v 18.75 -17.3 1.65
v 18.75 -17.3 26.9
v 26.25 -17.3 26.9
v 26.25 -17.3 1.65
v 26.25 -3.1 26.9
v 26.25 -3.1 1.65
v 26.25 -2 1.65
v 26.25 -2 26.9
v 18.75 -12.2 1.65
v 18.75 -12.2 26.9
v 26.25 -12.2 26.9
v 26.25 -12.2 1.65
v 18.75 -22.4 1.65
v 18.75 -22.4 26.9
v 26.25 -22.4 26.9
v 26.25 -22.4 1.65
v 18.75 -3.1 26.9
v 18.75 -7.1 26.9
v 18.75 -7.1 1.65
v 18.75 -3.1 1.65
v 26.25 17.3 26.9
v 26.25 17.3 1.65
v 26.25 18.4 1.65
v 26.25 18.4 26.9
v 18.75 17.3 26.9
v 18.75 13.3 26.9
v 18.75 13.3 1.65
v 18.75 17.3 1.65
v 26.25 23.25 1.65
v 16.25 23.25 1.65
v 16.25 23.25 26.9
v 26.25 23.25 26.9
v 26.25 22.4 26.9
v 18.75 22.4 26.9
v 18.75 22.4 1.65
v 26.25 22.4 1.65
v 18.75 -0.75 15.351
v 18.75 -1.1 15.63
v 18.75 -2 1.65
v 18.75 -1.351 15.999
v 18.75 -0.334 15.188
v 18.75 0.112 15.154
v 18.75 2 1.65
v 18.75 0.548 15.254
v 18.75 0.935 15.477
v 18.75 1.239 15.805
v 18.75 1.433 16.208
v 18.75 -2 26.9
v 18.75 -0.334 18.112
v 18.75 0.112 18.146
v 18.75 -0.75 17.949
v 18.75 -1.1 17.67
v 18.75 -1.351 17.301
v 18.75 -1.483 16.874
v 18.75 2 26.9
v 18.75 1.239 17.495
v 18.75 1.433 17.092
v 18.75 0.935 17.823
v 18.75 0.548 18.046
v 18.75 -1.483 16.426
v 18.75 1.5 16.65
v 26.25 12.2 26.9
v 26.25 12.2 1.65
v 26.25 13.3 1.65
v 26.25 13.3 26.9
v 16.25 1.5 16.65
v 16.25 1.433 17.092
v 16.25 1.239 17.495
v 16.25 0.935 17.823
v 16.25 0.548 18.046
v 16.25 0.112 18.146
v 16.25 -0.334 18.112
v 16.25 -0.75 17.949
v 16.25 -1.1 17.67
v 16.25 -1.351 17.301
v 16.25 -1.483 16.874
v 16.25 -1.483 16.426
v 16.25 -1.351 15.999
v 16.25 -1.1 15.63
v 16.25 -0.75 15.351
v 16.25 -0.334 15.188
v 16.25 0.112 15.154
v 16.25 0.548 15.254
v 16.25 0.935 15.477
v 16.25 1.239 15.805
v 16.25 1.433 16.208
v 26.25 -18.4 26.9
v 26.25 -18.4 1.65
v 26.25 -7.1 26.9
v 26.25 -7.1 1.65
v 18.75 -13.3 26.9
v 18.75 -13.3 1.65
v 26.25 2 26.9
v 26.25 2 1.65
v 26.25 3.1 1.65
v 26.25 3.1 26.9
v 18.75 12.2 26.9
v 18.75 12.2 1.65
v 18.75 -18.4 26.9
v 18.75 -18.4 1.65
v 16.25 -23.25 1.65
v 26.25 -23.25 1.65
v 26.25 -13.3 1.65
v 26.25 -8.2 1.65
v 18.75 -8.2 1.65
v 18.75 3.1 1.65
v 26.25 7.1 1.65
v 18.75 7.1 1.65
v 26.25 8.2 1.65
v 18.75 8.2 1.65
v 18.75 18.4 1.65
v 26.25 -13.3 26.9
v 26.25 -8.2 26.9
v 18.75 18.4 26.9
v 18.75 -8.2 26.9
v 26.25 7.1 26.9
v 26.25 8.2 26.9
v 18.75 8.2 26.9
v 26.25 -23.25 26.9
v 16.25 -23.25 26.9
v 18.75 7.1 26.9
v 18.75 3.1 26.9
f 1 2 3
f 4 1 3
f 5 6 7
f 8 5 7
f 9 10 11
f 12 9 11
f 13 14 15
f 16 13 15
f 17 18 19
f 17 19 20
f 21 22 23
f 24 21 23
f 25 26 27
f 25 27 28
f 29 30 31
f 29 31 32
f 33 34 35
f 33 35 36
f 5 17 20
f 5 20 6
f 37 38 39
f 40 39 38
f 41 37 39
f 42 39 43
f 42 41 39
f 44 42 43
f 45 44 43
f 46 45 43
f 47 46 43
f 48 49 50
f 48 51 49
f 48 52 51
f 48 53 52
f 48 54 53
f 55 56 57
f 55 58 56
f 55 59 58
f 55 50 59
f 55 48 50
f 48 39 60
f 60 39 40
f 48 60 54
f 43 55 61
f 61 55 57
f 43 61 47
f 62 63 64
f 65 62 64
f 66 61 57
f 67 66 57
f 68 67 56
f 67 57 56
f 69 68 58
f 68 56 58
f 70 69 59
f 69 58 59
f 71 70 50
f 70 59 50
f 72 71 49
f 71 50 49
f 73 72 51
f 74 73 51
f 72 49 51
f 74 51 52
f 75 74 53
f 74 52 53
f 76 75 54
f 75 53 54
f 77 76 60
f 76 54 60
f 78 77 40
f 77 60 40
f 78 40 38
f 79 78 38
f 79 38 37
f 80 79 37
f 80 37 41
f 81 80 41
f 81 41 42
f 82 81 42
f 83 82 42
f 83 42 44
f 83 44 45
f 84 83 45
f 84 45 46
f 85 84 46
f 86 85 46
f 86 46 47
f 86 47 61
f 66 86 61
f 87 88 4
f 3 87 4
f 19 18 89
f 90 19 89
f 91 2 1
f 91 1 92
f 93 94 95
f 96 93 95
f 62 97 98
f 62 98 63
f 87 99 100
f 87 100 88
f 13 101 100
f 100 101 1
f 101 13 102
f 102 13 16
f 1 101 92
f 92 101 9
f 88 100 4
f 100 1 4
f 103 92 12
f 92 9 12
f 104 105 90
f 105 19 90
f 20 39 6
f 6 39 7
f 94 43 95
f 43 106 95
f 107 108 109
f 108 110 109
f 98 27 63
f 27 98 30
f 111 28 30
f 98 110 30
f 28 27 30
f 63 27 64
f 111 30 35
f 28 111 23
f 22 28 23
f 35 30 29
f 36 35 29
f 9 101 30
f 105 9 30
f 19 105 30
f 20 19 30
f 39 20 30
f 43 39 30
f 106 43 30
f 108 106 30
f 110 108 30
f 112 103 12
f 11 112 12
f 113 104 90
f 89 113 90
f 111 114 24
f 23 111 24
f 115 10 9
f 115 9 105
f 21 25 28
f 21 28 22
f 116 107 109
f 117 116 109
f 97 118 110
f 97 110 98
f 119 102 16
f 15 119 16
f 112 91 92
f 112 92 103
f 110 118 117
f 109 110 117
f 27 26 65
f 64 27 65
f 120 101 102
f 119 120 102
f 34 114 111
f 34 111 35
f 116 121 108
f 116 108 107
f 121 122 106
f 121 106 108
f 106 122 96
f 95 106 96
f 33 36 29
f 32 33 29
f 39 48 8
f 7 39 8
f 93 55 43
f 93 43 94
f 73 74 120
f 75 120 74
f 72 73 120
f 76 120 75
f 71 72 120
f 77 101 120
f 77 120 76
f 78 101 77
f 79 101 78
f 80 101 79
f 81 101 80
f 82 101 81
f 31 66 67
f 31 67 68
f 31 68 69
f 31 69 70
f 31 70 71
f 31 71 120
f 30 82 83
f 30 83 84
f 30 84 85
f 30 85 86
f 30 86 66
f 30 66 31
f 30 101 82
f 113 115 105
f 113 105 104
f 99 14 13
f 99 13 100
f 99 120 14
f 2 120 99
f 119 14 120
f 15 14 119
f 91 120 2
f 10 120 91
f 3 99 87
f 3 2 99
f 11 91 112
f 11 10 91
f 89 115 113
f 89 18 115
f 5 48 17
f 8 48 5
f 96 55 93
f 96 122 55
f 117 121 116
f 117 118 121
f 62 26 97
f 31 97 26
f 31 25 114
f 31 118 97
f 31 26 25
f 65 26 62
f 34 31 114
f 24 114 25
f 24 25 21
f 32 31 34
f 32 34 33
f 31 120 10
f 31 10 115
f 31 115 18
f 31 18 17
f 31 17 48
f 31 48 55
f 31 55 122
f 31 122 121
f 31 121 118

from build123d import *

# Parameters (mm, degrees)
SKETCH002_W     = 10
SKETCH002_H     = 46.5
PAD001_DEPTH    = 25.25
SKETCH003_W     = 10
SKETCH003_H     = 4
POCKET001_DEPTH = 25.25
SKETCH004_R     = 1.5
POCKET002_DEPTH = 5


with BuildPart() as part:
    # Sketch002 → Pad001 (new body)
    with BuildSketch(Plane.XY):
        Rectangle(SKETCH002_W, SKETCH002_H)
    extrude(amount=PAD001_DEPTH)

    # Sketch003 (on Face6 of Pad001) → Pocket001 (cut)
    with BuildSketch(Plane.XY.offset(25.25)):
        with Locations((2.5, 20.4)):
            Rectangle(SKETCH003_W, SKETCH003_H)
        with Locations((2.5, 10.2)):
            Rectangle(SKETCH003_W, SKETCH003_H)
        with Locations((2.5, 15.3)):
            Rectangle(SKETCH003_W, SKETCH003_H)
        with Locations((2.5, 5.1)):
            Rectangle(SKETCH003_W, SKETCH003_H)
        with Locations((2.5, 0)):
            Rectangle(SKETCH003_W, SKETCH003_H)
        with Locations((2.5, -20.4)):
            Rectangle(SKETCH003_W, SKETCH003_H)
        with Locations((2.5, -15.3)):
            Rectangle(SKETCH003_W, SKETCH003_H)
        with Locations((2.5, -10.2)):
            Rectangle(SKETCH003_W, SKETCH003_H)
        with Locations((2.5, -5.1)):
            Rectangle(SKETCH003_W, SKETCH003_H)
    extrude(amount=-POCKET001_DEPTH, mode=Mode.SUBTRACT)

    # Sketch004 (on Face26 of Pocket001) → Pocket002 (cut)
    with BuildSketch(Plane.YZ.offset(-2.5)):
        with Locations((0, 15)):
            Circle(SKETCH004_R)
    extrude(amount=-POCKET002_DEPTH, mode=Mode.SUBTRACT)


with BuildPart() as part_1:
    # Body001 placement: moved
    add(part.part.moved(Location((21.25, 0, 1.65))))


solid = part_1.part
